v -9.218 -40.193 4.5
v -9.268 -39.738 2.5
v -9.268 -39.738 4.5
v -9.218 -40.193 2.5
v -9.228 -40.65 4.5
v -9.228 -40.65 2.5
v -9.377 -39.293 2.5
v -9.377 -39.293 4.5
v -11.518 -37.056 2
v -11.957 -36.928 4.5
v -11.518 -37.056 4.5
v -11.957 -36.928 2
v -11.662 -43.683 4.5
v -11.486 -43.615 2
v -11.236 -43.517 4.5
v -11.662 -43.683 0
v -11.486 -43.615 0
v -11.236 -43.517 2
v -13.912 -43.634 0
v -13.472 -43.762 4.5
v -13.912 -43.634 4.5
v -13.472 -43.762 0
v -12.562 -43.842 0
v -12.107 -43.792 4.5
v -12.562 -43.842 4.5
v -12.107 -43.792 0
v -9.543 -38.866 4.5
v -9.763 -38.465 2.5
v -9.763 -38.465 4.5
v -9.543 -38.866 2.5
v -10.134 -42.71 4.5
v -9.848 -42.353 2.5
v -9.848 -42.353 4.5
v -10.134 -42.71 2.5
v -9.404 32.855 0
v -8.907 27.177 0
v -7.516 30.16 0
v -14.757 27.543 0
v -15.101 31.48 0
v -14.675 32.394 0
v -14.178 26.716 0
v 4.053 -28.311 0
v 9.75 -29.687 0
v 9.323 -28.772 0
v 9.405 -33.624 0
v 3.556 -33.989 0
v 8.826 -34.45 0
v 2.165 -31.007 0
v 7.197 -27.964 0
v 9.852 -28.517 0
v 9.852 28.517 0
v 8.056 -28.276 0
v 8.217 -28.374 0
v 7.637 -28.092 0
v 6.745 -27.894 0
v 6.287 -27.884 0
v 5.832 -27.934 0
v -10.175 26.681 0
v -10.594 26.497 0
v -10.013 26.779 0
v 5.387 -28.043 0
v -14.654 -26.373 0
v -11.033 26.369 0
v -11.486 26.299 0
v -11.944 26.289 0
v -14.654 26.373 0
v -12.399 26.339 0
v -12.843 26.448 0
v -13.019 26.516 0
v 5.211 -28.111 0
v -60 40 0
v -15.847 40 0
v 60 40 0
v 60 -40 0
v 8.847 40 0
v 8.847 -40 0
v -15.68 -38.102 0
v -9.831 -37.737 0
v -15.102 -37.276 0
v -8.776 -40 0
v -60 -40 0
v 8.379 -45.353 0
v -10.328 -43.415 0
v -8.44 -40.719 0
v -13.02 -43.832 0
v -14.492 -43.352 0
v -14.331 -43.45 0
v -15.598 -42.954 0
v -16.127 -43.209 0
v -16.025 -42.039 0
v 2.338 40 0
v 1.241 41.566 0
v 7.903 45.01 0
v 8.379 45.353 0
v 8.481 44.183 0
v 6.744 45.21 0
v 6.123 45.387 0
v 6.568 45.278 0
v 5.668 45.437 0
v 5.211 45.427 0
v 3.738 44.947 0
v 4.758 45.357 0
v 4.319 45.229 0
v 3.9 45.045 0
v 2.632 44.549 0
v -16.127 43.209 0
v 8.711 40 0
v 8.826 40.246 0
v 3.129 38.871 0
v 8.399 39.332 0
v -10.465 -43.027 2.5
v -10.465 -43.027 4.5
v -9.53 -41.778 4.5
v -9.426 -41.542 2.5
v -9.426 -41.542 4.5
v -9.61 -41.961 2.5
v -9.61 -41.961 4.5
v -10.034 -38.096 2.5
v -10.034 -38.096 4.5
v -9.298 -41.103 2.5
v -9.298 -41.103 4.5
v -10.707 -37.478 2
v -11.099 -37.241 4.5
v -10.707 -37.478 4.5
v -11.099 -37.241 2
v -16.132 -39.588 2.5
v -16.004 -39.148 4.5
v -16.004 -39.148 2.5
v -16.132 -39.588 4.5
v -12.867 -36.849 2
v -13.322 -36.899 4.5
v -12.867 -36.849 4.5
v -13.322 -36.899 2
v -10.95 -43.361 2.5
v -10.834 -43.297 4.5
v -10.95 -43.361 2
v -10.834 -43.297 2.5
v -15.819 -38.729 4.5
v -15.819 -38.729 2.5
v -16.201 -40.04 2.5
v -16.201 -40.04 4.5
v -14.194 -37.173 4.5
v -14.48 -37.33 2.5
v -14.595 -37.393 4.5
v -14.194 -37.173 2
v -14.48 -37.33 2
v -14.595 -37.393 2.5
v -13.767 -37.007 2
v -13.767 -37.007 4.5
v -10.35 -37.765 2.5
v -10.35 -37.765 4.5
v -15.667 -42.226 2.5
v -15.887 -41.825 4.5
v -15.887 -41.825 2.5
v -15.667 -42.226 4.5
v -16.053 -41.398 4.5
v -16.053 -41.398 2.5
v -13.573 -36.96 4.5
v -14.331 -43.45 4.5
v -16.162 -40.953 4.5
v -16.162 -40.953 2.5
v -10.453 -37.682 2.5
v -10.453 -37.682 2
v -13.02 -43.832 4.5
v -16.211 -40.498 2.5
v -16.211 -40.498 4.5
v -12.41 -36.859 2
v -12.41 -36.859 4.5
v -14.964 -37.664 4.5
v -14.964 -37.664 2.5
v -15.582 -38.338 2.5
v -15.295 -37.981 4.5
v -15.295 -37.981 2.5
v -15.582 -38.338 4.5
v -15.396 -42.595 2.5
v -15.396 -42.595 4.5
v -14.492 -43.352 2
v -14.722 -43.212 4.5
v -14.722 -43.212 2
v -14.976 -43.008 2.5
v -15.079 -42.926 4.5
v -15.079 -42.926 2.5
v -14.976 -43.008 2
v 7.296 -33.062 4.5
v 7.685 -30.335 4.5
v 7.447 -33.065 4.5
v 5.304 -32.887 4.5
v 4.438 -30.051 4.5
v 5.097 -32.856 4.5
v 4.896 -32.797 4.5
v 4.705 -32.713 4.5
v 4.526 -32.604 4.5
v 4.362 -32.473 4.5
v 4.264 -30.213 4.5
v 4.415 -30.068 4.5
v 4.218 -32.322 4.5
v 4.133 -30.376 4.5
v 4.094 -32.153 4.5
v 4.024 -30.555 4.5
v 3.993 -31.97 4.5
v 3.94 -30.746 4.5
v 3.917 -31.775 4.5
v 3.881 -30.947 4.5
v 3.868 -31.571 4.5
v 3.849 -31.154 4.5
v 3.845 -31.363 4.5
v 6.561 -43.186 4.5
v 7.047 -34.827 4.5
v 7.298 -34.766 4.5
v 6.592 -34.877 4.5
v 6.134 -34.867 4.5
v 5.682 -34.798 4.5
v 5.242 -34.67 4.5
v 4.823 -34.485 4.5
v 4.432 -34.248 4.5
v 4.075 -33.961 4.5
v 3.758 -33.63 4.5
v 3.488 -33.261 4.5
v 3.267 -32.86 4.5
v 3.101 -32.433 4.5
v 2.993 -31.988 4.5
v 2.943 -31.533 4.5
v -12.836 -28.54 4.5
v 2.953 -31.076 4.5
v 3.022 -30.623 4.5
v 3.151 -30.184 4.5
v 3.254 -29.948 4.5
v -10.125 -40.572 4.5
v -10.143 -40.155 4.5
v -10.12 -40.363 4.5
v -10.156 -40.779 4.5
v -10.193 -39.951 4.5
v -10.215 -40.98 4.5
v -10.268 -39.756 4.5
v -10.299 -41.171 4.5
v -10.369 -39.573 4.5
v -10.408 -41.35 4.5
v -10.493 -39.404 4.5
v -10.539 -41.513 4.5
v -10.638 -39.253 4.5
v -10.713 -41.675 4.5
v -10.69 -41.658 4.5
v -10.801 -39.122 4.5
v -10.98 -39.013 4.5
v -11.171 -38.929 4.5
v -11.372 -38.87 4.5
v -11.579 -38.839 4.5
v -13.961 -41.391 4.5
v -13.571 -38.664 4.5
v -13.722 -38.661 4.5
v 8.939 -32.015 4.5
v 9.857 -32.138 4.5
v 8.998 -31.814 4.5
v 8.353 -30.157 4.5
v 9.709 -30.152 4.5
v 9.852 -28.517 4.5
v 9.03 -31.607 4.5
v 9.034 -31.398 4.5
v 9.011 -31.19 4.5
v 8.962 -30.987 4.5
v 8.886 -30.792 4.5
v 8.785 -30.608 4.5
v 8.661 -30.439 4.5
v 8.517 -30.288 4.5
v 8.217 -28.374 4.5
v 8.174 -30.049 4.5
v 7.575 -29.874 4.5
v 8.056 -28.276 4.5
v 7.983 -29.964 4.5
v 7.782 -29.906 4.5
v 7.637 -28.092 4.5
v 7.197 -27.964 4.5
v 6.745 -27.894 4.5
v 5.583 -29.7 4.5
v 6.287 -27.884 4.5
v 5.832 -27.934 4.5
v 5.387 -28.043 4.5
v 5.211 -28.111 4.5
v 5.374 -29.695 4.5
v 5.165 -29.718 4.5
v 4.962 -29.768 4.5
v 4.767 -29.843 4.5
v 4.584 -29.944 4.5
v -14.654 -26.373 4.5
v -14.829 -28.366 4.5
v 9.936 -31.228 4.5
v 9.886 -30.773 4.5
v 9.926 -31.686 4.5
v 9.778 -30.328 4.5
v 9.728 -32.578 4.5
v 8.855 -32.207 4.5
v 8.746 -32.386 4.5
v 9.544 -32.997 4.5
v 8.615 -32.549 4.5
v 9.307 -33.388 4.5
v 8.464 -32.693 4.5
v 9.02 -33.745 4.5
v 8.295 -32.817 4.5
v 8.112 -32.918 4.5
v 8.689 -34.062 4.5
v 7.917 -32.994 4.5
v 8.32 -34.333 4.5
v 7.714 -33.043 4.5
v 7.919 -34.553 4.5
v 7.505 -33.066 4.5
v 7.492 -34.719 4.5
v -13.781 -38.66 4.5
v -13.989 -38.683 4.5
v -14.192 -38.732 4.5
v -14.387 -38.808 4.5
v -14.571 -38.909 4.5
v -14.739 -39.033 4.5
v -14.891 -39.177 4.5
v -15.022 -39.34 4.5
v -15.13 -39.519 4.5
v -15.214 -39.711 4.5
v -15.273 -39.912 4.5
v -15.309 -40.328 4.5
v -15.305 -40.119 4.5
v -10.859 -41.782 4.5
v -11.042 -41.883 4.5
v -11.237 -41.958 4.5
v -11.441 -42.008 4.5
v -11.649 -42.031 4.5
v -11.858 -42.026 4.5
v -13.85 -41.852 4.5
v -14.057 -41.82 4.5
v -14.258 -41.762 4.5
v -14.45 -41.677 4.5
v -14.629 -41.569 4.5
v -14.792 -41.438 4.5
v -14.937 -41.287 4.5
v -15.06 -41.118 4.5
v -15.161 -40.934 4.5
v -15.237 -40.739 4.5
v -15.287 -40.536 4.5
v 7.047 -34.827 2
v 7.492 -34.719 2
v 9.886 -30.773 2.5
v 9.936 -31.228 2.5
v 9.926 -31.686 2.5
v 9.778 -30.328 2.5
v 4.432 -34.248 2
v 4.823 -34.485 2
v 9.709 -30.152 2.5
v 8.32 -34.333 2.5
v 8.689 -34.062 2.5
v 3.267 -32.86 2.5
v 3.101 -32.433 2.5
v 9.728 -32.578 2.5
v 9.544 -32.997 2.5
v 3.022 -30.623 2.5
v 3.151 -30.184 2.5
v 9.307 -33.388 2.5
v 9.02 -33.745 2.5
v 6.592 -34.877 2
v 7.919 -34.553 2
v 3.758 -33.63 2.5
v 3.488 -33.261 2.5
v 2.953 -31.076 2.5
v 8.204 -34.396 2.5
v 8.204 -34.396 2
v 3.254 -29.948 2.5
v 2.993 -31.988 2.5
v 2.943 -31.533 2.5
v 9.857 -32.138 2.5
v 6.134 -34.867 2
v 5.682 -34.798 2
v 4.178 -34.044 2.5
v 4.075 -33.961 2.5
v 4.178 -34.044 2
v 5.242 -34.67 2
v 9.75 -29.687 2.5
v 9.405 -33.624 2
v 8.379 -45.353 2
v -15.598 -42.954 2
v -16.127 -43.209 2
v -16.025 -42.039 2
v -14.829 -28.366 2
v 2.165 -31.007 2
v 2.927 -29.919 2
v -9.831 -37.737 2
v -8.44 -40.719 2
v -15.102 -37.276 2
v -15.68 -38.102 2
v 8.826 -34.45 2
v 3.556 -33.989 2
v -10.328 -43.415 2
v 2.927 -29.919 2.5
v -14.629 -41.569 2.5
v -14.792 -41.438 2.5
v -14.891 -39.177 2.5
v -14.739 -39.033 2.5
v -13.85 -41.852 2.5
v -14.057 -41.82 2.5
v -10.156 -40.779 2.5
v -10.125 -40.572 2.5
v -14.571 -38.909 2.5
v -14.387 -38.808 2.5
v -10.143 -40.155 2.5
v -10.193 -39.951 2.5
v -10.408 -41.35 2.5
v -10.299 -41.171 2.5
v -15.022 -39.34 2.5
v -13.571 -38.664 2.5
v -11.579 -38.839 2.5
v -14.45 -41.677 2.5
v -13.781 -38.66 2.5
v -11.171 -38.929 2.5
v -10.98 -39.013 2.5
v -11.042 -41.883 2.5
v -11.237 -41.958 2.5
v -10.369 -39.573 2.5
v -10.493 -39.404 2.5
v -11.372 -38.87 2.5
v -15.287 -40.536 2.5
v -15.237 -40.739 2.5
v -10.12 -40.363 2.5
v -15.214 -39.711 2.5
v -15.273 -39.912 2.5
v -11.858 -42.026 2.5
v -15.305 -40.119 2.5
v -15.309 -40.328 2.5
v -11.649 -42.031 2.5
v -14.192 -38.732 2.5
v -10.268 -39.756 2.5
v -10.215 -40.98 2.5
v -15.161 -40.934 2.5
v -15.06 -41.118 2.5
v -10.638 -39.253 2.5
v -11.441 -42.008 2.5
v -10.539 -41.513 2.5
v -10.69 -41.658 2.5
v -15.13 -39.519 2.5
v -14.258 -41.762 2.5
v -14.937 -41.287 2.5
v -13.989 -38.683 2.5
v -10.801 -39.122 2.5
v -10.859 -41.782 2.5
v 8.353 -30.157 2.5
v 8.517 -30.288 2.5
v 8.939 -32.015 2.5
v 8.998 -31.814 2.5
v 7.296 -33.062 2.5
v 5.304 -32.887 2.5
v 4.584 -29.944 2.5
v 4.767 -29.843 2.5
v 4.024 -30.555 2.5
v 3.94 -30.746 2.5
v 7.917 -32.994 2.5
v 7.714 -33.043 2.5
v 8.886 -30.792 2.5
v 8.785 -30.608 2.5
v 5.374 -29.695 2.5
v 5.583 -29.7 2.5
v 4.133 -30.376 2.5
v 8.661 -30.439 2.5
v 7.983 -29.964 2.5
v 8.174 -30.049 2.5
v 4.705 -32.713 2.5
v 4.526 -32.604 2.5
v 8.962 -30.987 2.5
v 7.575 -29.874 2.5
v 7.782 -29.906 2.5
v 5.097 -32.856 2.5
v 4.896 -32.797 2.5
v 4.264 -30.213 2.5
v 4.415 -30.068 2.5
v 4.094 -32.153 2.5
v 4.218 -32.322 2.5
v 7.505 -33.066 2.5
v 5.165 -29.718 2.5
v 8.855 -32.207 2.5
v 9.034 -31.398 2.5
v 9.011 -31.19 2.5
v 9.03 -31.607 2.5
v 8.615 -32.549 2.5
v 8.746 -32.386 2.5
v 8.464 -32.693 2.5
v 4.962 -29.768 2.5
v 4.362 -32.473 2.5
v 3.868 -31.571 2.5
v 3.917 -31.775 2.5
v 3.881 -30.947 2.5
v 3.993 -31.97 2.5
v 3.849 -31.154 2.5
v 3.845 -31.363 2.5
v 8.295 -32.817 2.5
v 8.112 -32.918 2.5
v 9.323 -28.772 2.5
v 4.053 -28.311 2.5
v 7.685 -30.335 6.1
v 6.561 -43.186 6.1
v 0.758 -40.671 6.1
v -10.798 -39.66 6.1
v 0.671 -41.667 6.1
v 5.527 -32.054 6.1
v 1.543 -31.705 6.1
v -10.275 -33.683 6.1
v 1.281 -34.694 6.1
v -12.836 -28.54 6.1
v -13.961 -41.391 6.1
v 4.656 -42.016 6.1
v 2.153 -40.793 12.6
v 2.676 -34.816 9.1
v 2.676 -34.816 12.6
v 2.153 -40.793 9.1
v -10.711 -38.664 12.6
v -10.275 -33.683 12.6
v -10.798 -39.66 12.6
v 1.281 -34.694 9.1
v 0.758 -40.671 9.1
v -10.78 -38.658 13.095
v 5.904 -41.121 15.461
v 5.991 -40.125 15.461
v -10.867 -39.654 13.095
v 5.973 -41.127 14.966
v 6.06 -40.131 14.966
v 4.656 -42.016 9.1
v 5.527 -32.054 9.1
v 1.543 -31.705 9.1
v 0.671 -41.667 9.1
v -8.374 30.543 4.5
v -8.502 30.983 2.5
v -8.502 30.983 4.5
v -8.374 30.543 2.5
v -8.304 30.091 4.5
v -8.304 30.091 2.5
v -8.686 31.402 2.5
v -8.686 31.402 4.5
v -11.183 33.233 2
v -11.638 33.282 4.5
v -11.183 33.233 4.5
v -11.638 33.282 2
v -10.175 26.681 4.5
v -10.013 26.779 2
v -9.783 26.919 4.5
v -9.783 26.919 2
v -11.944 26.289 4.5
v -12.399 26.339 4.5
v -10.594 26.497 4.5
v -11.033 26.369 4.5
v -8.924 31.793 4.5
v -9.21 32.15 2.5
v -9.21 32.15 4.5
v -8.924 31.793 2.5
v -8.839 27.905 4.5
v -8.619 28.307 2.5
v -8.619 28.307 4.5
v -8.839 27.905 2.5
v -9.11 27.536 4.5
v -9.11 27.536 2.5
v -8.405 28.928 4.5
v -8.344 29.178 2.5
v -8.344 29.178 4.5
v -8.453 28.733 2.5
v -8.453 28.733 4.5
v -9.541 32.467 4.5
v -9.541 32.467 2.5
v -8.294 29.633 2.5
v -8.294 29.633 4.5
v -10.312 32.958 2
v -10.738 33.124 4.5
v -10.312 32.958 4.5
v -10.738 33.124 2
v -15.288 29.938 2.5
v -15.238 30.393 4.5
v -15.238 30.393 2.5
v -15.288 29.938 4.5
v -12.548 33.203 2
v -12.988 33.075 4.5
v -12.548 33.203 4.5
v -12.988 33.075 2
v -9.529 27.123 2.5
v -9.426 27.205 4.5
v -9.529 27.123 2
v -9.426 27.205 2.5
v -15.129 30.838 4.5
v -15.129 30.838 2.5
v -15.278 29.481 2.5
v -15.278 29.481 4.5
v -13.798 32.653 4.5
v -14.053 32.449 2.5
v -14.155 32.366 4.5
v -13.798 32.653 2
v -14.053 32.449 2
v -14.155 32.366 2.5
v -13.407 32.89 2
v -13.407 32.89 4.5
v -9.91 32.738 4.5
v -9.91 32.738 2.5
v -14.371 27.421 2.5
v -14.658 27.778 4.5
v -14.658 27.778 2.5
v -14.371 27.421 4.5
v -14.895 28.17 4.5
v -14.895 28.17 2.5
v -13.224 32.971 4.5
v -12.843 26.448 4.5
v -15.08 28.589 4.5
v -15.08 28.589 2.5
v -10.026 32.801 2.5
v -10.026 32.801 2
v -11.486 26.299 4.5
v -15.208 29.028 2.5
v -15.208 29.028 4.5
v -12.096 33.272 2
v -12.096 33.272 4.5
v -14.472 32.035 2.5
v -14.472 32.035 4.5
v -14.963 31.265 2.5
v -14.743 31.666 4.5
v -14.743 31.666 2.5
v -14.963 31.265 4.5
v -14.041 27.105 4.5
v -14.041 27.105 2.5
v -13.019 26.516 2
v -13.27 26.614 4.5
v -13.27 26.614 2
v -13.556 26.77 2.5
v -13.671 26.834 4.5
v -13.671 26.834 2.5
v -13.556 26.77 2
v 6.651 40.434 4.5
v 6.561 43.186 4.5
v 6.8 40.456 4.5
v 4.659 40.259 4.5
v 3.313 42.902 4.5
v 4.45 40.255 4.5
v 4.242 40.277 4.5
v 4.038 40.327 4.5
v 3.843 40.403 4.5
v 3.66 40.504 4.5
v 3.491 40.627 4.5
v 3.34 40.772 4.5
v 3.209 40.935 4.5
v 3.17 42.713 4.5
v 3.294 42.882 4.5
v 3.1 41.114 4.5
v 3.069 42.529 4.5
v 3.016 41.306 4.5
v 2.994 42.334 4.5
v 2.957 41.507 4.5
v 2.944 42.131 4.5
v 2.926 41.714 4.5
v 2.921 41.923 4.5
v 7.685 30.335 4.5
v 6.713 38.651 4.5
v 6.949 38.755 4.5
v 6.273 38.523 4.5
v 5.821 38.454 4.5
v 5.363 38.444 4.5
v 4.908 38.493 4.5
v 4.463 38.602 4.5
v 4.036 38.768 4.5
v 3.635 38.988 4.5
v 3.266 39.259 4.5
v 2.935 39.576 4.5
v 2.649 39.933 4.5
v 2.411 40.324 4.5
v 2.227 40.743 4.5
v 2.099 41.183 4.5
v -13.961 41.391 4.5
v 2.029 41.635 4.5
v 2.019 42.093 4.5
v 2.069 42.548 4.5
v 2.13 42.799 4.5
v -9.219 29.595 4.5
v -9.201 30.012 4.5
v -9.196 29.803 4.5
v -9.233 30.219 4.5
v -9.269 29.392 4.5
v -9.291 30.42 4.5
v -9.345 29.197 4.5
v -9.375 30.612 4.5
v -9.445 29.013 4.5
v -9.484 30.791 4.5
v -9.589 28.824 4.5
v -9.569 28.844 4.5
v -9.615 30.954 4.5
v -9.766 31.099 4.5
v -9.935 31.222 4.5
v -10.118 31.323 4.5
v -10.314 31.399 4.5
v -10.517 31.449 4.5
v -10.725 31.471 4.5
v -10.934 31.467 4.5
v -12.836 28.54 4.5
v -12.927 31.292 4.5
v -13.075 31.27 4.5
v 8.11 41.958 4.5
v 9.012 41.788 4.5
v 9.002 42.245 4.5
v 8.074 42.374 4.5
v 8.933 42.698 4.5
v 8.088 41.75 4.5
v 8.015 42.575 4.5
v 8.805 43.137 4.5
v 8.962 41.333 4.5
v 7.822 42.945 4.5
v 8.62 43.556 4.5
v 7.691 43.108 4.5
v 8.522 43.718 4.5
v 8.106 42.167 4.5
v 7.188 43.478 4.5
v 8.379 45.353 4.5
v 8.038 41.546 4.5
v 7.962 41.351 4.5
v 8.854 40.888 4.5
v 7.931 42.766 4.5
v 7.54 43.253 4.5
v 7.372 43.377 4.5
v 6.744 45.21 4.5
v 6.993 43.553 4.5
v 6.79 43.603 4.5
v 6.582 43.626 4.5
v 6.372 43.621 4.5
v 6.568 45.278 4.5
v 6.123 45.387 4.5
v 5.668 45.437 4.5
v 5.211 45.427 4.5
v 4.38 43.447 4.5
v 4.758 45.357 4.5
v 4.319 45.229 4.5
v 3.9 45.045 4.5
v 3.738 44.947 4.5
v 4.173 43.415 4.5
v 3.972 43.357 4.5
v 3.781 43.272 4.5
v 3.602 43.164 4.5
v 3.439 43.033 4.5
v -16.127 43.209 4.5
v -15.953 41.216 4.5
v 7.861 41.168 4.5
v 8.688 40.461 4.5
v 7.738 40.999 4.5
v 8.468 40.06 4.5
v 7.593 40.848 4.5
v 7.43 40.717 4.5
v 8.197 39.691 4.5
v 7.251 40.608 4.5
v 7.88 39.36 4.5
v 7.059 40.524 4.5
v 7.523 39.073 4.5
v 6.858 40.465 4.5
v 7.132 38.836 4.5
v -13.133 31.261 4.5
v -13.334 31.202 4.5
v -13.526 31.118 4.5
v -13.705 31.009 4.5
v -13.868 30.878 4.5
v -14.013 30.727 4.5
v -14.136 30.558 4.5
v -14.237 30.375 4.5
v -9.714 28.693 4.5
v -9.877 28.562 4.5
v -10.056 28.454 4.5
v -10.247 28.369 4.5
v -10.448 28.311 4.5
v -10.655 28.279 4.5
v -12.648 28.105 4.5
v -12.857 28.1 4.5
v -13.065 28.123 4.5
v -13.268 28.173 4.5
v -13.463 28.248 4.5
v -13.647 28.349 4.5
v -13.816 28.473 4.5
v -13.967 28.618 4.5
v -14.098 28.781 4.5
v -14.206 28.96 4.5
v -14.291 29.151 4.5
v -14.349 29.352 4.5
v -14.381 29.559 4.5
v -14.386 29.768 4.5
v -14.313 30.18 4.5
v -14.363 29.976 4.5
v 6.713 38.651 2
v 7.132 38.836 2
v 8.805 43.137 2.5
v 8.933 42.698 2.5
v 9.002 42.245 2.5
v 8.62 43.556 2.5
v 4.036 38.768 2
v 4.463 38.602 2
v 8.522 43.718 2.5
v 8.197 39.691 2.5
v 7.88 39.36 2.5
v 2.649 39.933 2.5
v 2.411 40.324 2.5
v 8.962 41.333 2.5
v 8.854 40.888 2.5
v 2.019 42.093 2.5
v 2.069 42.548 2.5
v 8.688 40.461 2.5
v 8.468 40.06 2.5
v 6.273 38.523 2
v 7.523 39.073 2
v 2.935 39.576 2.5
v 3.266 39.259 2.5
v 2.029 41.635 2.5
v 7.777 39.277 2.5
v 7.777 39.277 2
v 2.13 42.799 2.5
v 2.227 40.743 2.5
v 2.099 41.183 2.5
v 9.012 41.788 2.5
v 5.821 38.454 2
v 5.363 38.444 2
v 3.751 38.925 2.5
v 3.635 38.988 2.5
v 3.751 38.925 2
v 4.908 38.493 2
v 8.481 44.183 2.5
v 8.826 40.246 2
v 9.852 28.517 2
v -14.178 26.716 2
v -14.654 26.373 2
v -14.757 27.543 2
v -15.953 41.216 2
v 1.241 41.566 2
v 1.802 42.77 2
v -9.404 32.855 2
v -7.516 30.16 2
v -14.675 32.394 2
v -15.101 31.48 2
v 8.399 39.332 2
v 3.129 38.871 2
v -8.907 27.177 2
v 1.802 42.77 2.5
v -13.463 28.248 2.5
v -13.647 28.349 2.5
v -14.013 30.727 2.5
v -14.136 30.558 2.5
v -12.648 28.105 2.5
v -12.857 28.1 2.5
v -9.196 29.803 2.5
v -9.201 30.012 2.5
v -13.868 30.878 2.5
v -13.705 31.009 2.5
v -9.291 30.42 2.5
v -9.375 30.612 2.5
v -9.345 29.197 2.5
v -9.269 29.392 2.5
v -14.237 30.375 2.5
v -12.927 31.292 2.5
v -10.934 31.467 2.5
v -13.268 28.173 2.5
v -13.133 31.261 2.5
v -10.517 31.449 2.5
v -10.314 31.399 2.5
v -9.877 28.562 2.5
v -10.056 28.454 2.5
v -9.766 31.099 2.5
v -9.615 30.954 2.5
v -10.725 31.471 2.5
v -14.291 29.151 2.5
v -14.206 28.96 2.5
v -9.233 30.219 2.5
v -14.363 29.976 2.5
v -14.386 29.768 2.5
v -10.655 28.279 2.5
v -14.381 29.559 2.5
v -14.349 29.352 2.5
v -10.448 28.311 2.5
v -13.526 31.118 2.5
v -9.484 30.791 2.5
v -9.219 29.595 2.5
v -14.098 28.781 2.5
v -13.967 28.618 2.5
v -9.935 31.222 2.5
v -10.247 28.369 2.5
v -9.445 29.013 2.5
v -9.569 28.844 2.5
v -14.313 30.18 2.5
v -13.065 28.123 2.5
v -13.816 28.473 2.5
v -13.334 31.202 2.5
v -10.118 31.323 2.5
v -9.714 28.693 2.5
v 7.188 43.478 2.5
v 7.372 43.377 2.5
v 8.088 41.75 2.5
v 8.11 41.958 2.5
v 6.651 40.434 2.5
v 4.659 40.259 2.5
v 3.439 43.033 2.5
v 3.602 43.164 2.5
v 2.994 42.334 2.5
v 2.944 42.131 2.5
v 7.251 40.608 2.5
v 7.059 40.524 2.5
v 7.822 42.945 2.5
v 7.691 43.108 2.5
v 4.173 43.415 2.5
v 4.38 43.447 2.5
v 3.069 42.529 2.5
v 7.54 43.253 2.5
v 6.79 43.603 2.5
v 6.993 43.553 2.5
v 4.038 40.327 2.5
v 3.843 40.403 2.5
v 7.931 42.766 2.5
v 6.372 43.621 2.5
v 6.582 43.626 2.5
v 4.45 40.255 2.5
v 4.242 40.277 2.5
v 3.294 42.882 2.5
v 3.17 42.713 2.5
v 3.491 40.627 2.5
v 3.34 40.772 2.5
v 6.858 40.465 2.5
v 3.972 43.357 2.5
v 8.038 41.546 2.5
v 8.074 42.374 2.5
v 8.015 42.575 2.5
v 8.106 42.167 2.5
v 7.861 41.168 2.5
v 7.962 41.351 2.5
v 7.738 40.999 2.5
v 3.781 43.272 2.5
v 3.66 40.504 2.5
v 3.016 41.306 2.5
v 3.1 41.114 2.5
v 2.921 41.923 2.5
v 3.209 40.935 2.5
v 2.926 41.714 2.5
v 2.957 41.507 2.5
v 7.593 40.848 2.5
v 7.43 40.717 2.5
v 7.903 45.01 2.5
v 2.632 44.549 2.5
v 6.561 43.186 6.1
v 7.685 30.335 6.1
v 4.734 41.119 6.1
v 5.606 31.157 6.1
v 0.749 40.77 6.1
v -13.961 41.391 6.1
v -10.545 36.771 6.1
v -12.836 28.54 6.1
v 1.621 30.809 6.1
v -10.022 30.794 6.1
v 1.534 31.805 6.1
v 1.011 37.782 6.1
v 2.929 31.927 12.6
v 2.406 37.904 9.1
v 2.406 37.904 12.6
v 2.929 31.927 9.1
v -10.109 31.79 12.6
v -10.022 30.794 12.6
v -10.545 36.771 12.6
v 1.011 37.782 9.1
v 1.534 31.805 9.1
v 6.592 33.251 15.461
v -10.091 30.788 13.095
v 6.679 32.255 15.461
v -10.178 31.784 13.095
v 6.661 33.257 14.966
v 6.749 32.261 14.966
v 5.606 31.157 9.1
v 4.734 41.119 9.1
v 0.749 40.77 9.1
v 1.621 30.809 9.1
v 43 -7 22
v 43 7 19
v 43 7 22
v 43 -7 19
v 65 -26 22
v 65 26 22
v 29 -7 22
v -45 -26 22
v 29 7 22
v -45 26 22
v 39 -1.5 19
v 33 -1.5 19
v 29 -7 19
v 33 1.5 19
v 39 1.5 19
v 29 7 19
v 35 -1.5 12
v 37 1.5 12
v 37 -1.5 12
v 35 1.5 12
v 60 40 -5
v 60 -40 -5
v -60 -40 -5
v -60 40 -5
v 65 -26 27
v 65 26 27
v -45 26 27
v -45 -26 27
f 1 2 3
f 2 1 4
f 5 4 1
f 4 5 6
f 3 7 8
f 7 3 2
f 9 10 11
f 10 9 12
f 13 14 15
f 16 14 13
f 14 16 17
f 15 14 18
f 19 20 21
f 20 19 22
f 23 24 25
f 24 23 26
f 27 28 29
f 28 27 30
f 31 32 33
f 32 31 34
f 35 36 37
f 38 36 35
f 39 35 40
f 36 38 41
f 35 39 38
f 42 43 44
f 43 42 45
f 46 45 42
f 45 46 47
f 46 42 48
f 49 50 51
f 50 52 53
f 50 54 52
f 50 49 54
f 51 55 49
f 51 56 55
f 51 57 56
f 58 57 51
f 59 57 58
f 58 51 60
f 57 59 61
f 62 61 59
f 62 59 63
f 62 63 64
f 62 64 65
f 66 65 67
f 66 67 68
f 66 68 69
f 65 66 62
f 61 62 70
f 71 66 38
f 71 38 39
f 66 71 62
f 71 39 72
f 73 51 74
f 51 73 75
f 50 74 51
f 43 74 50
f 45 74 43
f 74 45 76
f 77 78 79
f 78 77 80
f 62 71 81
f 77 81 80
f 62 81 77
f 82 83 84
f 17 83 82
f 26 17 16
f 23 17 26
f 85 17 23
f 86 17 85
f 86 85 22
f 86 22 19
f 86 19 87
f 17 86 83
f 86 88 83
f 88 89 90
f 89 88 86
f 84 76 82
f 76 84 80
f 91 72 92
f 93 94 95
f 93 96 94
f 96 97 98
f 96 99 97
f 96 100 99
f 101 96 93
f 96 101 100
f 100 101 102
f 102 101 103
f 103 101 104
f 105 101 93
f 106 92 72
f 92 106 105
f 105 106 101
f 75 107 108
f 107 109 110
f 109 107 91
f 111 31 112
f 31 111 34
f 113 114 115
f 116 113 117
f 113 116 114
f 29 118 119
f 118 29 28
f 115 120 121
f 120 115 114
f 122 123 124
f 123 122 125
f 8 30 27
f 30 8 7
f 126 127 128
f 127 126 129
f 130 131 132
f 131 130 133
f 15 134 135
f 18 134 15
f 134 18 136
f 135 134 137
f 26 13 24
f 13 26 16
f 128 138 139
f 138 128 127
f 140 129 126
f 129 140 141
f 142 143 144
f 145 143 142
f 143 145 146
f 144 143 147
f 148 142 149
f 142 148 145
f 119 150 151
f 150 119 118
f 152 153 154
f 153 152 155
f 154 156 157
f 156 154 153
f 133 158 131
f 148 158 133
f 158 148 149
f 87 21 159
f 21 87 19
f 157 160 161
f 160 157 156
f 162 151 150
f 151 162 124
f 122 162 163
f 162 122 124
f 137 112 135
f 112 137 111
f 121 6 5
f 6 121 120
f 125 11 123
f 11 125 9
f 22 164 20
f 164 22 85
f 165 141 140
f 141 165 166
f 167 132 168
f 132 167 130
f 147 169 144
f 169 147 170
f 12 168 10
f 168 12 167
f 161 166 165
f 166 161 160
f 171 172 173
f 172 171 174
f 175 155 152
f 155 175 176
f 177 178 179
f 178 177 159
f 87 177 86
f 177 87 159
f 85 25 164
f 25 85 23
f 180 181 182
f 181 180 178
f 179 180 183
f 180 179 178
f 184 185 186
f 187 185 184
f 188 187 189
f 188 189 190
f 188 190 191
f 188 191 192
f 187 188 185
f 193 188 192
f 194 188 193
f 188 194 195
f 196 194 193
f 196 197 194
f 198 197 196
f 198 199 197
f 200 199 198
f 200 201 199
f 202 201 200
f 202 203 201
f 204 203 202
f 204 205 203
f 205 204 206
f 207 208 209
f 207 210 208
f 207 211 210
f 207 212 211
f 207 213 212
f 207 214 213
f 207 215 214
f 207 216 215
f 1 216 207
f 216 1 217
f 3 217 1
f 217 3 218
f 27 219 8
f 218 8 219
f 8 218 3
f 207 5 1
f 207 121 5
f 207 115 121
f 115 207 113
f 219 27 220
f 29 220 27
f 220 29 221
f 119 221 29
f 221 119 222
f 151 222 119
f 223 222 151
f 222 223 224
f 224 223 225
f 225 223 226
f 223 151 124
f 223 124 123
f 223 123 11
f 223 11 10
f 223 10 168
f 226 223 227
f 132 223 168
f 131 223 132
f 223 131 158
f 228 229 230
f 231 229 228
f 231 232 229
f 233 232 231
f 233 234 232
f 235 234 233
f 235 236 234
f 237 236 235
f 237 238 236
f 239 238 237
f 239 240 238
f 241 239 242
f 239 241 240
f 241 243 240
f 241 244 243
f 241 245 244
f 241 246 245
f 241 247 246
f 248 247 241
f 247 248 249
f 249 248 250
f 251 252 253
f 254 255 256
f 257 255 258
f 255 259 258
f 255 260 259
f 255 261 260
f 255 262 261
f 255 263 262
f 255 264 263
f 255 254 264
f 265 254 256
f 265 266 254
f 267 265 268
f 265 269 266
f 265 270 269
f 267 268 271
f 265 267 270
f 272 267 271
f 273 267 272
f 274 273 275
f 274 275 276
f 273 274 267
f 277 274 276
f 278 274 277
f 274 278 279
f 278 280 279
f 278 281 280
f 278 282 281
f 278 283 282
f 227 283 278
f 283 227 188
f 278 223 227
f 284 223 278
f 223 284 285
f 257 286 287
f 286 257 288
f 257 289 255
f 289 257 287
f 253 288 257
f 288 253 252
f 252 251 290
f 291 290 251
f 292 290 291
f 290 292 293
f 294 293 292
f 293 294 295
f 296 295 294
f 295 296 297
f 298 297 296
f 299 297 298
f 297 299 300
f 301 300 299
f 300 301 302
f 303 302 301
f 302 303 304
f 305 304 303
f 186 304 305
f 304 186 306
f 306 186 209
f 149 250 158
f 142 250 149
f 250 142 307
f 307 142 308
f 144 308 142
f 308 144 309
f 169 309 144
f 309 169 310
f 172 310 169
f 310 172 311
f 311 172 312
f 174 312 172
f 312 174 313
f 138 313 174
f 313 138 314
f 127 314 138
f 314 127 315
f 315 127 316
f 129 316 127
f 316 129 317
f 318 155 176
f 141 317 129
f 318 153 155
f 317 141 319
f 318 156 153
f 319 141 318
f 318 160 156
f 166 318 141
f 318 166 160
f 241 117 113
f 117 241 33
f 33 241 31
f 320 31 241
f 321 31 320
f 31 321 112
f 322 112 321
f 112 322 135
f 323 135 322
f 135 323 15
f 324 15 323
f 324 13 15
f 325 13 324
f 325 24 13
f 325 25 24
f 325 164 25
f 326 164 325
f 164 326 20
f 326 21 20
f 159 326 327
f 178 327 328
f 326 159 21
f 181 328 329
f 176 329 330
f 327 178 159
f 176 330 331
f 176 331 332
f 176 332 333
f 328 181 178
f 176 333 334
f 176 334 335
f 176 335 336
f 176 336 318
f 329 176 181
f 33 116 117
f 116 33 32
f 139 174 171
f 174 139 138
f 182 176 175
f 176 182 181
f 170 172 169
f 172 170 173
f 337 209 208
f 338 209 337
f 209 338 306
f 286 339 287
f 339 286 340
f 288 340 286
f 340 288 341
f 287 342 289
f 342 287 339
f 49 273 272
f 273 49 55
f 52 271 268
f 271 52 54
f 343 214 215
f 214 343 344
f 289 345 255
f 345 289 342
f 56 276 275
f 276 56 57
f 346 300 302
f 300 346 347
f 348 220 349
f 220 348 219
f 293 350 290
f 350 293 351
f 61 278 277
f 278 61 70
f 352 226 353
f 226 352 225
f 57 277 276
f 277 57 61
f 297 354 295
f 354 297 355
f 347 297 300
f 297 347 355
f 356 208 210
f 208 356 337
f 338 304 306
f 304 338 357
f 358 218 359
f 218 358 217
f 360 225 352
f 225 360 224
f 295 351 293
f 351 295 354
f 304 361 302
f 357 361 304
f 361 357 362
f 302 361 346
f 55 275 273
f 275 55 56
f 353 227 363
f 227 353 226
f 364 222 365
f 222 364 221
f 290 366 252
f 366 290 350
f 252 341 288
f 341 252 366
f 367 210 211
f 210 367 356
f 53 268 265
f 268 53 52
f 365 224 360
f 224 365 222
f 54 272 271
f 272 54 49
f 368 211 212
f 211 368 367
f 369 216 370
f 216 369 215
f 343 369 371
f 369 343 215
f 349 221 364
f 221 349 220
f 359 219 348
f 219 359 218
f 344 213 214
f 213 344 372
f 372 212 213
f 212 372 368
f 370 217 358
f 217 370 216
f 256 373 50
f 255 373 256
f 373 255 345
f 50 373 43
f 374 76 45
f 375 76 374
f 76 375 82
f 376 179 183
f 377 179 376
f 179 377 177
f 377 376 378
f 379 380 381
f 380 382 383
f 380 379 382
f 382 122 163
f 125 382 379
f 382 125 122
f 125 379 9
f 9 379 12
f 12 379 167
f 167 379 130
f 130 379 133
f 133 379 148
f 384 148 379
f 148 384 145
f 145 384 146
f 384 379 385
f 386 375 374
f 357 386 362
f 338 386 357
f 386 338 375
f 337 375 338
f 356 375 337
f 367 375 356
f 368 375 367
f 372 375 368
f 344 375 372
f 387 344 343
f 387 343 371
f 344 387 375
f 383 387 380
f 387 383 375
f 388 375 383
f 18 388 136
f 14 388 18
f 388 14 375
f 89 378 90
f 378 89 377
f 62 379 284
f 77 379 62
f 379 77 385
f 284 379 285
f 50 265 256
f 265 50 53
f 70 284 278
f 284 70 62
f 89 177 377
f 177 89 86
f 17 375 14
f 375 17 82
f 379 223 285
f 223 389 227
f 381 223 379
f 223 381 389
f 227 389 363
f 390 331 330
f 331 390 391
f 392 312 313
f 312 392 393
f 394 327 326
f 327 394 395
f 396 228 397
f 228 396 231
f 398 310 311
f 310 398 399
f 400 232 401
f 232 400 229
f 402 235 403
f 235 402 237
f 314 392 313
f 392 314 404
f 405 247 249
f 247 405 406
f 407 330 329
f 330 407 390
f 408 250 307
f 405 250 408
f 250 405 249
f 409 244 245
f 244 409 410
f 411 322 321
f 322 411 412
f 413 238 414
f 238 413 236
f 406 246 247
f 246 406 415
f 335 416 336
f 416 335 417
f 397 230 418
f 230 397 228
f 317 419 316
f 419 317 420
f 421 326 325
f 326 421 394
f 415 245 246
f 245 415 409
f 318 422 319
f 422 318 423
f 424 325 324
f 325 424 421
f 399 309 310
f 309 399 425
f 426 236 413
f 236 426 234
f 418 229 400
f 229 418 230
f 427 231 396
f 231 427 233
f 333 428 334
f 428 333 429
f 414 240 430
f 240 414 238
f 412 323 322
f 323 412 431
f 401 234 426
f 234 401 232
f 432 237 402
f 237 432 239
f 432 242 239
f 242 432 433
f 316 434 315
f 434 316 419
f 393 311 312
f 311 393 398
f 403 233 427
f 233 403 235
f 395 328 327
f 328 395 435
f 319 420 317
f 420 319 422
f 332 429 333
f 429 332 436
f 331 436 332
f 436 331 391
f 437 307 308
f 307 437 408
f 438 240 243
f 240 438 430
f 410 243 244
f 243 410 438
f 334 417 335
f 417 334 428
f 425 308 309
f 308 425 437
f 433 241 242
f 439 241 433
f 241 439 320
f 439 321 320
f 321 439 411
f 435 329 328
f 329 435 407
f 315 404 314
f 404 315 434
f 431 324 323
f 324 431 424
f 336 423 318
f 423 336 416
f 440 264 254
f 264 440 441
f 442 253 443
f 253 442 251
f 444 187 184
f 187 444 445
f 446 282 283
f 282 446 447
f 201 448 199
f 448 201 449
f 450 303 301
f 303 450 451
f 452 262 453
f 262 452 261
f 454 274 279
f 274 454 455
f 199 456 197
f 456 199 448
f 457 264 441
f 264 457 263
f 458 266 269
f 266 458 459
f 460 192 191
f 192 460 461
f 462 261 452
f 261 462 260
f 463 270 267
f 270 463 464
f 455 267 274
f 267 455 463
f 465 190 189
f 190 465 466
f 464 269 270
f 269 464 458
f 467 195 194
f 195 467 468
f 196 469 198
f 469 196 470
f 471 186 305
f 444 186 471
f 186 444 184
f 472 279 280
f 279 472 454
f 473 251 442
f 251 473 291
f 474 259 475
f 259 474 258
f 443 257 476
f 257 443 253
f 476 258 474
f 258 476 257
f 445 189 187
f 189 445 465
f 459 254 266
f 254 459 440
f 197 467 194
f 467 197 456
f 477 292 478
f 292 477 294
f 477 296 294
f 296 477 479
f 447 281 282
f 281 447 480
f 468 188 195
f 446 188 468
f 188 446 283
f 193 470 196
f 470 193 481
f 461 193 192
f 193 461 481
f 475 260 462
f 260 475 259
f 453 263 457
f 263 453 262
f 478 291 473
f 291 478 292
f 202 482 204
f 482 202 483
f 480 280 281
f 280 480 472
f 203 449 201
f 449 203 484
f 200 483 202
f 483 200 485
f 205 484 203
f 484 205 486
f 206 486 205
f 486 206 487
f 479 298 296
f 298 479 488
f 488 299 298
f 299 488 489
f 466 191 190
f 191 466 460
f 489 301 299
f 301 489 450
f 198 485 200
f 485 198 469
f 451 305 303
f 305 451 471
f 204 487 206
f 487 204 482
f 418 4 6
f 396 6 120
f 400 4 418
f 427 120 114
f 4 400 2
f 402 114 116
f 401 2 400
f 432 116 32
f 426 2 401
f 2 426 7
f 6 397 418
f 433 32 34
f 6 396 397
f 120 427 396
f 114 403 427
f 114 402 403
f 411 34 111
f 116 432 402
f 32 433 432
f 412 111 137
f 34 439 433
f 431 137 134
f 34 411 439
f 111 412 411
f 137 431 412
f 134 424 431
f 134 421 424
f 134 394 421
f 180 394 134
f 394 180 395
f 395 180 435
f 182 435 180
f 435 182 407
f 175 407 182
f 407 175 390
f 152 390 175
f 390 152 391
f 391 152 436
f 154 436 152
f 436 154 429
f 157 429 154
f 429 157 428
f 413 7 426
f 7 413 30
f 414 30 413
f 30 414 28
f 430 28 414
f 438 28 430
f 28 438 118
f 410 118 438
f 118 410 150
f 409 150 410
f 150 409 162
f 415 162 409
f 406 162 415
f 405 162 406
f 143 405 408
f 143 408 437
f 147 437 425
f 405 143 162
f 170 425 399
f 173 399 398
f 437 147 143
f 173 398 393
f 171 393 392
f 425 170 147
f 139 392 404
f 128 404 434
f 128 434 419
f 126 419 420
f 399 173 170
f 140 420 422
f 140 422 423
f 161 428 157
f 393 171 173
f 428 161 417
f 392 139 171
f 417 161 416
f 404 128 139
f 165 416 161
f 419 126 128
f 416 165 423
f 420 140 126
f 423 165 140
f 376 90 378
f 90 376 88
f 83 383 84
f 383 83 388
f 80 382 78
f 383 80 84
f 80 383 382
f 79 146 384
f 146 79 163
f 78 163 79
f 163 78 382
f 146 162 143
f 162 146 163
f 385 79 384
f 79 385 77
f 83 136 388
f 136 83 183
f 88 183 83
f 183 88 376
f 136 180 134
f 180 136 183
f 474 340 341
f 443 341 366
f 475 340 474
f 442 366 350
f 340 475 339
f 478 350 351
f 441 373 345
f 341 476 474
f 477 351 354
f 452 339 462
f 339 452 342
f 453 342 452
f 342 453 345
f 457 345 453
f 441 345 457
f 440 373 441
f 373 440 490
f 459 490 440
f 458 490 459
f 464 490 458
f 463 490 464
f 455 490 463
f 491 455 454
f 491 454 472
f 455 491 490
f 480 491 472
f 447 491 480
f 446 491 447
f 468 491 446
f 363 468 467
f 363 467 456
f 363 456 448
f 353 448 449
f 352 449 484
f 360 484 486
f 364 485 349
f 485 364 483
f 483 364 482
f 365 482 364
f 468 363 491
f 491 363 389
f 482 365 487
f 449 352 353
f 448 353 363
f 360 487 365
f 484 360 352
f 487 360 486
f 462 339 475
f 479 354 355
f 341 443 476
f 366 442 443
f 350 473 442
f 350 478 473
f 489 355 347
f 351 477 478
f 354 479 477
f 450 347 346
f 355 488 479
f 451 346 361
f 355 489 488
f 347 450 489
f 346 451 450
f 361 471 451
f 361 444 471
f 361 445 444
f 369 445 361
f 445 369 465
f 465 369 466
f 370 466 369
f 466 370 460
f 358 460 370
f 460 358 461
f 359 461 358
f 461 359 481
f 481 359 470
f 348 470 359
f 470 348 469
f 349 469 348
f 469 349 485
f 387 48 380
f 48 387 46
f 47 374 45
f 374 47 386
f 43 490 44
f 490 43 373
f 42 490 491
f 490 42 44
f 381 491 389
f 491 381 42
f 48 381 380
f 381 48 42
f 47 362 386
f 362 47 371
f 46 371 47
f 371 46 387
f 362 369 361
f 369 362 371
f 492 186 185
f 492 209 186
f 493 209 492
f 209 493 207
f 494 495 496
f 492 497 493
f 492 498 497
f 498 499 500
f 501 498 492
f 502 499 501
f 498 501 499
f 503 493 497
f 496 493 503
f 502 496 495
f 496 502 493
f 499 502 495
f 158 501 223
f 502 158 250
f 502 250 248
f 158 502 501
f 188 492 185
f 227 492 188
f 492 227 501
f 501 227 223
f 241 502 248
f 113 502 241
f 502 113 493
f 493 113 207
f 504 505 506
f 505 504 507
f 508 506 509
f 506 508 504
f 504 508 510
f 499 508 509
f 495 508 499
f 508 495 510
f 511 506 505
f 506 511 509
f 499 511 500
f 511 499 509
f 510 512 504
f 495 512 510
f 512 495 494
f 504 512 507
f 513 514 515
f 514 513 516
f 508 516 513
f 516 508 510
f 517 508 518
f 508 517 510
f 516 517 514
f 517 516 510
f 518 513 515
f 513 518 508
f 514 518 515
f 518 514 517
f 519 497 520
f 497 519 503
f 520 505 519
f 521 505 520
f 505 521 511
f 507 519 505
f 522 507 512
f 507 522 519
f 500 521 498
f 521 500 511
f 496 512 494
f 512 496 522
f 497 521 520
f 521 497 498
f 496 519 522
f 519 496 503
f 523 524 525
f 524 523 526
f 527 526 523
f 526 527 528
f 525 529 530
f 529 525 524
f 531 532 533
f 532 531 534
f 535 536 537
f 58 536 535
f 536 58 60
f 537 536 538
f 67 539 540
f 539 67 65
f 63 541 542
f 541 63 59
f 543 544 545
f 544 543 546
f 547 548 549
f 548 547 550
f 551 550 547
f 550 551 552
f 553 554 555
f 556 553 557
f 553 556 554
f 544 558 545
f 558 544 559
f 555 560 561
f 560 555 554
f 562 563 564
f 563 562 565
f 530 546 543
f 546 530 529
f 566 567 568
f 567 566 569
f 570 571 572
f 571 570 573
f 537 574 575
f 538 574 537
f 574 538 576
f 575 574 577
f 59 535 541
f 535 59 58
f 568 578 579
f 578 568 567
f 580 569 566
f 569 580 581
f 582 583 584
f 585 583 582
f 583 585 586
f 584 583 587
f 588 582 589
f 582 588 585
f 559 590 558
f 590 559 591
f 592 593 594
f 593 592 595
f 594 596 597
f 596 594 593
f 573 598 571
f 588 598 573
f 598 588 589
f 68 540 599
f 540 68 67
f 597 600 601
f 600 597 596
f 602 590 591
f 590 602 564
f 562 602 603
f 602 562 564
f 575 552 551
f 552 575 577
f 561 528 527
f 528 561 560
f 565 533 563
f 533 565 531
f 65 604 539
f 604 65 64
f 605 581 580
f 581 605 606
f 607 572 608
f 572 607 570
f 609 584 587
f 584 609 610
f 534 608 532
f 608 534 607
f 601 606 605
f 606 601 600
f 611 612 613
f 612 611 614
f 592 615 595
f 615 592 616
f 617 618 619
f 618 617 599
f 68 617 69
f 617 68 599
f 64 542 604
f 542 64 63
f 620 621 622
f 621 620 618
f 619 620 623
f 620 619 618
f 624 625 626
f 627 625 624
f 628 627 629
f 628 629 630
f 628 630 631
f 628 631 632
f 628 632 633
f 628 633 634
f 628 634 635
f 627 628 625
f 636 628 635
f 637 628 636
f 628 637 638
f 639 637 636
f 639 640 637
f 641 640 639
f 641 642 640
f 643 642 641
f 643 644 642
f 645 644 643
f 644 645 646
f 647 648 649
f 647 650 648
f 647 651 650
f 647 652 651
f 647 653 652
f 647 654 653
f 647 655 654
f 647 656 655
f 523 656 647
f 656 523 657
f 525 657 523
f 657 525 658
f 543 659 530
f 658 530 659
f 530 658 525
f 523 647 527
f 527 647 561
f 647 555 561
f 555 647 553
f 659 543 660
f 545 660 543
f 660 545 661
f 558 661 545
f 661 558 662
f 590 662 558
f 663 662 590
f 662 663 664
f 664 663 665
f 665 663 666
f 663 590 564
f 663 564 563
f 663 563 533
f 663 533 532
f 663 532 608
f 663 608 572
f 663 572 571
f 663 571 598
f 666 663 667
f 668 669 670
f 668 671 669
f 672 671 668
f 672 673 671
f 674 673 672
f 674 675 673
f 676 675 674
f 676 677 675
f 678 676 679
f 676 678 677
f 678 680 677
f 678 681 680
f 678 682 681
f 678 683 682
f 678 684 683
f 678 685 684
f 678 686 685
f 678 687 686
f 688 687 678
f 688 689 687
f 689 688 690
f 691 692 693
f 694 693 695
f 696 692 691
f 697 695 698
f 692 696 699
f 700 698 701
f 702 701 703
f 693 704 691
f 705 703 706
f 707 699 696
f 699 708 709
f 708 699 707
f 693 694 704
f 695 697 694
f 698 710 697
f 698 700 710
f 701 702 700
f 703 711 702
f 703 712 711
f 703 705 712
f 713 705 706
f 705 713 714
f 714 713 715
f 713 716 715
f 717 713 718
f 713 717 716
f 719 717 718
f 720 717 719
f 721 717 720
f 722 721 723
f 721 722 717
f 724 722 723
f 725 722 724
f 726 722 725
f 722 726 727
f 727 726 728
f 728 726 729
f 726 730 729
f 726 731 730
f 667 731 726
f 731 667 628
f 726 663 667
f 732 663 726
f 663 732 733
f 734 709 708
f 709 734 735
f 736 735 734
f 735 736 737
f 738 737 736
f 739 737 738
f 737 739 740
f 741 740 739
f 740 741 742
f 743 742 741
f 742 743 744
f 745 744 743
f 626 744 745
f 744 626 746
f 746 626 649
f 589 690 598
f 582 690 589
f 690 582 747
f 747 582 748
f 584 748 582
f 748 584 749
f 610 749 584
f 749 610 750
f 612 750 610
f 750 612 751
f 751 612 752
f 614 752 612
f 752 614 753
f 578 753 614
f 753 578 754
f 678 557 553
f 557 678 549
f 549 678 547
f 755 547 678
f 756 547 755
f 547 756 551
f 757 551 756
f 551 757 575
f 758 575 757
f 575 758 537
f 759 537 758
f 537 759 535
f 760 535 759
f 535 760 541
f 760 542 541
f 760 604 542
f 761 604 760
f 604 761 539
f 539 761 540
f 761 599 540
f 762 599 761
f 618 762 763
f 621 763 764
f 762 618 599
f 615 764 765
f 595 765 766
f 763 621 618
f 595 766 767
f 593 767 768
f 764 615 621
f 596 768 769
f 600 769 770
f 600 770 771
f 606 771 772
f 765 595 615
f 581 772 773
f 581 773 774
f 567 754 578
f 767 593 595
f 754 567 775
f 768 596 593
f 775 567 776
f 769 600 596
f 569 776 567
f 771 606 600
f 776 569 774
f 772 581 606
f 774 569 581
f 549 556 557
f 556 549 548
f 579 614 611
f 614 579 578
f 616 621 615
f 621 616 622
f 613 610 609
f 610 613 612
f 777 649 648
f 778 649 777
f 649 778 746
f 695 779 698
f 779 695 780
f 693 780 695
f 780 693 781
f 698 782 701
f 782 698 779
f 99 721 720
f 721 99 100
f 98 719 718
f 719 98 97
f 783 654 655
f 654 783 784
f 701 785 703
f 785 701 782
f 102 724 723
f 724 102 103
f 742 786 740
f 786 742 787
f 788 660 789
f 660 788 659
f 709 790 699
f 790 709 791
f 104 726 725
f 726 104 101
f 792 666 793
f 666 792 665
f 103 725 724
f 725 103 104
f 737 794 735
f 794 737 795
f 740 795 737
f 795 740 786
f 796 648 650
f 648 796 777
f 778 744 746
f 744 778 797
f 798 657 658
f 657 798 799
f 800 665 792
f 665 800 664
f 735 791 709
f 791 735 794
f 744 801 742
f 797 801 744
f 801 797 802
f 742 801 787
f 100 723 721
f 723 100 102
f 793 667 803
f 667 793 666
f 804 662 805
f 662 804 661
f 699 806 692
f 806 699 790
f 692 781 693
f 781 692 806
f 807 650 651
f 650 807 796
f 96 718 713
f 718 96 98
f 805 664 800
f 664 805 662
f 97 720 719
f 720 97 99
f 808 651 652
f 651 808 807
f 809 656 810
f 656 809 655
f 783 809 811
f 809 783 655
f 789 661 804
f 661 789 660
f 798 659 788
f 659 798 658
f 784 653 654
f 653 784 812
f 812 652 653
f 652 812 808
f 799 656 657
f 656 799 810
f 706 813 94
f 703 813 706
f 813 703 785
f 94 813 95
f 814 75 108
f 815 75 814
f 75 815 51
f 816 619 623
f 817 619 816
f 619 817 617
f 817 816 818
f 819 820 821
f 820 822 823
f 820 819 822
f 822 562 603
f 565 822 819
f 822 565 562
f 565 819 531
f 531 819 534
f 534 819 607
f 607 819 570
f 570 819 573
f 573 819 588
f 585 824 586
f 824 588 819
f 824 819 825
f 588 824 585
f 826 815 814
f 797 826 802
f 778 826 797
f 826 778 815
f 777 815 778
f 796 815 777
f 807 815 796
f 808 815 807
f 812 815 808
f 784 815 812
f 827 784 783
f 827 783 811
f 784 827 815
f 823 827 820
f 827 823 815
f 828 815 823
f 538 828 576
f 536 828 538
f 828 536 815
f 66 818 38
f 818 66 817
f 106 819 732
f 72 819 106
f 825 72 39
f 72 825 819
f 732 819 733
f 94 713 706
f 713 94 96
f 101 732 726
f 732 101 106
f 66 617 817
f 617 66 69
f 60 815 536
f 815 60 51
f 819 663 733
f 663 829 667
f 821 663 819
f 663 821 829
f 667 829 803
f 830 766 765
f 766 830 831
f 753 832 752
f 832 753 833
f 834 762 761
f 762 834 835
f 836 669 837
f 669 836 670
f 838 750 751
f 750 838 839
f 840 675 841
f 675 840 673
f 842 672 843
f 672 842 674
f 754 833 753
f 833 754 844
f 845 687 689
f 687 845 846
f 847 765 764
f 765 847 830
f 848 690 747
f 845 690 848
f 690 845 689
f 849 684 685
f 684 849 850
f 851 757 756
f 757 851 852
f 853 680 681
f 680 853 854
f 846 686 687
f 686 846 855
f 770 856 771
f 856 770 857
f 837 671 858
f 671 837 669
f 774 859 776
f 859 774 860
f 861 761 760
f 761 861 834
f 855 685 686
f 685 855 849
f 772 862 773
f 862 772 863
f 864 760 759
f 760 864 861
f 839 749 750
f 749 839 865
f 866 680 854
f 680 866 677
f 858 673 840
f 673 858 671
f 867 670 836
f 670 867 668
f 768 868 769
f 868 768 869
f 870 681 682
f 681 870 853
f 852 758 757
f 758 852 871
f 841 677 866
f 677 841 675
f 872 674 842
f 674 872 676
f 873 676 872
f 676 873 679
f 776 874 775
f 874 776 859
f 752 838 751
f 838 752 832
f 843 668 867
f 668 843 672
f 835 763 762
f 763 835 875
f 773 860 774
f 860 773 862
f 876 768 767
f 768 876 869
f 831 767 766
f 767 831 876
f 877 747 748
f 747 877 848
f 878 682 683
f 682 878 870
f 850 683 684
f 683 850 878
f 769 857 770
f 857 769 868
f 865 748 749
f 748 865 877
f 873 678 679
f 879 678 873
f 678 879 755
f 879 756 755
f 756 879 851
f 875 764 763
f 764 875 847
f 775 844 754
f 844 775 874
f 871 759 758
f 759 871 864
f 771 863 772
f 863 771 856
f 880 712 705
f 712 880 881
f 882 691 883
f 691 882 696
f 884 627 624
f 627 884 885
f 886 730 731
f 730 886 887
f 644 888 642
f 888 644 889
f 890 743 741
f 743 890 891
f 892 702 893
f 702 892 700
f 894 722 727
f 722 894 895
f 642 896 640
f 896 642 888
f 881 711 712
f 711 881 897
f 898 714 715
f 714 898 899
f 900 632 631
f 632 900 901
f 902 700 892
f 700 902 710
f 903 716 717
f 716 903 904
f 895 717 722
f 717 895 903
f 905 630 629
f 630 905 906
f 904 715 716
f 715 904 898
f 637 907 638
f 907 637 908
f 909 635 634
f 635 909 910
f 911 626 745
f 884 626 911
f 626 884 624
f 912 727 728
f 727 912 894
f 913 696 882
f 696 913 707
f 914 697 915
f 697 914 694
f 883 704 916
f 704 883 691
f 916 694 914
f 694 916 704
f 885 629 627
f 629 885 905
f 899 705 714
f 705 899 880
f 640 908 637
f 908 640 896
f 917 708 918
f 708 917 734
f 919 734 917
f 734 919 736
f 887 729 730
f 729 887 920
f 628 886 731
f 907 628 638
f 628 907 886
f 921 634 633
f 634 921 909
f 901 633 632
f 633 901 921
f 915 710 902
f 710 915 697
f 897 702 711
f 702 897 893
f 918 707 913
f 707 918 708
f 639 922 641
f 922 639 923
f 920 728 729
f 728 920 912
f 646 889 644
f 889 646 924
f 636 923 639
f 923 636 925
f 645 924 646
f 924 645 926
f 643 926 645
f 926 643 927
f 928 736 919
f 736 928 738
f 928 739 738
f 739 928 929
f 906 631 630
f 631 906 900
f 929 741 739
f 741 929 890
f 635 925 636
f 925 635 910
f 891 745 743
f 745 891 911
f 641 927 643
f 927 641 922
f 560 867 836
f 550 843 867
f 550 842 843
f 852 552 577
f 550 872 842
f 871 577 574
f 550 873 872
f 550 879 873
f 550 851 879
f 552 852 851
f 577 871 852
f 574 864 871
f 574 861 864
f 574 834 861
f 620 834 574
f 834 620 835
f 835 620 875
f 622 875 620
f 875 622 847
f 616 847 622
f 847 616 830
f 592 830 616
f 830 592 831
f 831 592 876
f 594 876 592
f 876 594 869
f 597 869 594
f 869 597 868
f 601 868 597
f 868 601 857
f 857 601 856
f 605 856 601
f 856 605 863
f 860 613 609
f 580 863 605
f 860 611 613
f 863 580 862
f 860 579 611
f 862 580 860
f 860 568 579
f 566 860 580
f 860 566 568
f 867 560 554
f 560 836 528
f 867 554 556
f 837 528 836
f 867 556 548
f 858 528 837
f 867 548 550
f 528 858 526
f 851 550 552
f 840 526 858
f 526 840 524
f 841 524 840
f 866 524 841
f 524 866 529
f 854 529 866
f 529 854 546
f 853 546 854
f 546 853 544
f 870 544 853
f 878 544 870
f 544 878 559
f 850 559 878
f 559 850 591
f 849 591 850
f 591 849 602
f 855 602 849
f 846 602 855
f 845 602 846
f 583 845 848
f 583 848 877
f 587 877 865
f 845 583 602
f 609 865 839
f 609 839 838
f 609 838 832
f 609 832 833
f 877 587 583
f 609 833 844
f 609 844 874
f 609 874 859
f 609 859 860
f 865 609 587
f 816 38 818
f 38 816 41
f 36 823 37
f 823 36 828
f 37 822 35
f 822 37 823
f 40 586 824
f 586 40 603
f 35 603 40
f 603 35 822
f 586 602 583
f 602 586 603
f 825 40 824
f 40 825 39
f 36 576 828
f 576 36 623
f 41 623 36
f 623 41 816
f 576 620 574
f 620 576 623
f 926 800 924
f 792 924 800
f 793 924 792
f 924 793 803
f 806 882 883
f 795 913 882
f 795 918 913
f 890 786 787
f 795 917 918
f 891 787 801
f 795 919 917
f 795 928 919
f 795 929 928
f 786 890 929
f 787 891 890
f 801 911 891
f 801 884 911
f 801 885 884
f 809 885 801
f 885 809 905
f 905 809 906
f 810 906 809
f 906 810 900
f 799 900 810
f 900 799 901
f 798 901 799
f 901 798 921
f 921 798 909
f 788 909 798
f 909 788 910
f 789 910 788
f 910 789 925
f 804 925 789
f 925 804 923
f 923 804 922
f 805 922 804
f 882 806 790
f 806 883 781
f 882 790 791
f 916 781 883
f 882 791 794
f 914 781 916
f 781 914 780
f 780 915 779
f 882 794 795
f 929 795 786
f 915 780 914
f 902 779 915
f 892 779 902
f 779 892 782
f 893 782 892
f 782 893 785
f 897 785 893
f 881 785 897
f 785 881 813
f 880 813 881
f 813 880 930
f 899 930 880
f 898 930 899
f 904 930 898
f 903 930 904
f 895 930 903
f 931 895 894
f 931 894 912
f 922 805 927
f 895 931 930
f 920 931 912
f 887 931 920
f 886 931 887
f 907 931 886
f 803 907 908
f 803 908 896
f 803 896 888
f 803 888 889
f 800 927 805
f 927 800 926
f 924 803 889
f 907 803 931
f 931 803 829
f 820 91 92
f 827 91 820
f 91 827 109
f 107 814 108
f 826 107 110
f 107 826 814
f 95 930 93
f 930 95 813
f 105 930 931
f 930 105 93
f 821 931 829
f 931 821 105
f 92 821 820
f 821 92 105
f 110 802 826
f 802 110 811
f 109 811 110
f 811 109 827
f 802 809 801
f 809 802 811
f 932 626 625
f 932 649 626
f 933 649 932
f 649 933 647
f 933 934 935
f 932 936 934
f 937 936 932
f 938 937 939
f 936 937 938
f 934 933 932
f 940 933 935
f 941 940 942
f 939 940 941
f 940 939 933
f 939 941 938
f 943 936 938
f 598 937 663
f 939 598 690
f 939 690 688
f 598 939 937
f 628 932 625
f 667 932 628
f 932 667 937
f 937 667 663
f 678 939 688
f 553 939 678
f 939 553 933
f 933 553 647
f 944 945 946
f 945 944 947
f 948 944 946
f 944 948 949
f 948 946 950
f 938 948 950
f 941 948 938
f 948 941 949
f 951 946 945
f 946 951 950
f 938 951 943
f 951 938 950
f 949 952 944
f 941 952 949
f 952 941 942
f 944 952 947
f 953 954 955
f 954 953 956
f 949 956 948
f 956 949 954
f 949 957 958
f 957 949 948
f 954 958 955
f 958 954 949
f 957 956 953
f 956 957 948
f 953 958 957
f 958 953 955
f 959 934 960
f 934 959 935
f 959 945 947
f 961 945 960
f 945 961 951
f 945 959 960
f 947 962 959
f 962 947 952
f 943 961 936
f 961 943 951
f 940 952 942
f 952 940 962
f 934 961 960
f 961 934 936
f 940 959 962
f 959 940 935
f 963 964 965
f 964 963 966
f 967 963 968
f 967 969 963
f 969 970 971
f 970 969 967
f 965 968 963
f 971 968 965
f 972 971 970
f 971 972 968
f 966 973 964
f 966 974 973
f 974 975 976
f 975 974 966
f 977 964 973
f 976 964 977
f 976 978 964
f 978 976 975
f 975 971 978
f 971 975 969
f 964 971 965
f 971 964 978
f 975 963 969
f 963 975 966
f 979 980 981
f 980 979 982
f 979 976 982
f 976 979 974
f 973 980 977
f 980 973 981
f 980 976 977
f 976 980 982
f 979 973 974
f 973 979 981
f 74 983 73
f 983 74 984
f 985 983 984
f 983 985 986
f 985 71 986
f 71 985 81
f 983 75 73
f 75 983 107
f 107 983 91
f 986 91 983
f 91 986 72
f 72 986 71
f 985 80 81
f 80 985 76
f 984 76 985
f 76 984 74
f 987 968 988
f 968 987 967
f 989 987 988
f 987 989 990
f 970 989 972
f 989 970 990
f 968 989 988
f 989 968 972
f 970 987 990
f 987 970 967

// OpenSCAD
// owlet stepper head, by Mrunmoy
// Copyright (c) 2026 Mrunmoy. SPDX-License-Identifier: MIT
// https://github.com/Mrunmoy/owlet
//
// Mounts for the limit switches on the stepper head: the common 3D-printer
// endstop module (a lever microswitch on a 20.6 x 12.9 mm board with two
// corner holes and an S/G/V plug).
//
//   openscad -D 'part="pan_bracket"' -o stl/pan_bracket.stl switch_mounts.scad
//     parts: pan_bracket | pan_flag | assembly
//
// Pan: two brackets glued to the base deck at radius `r_sw`, 95 degrees
// either side of straight ahead; one flag glued under the yoke at the same
// radius, hanging down to press the switch levers. Tilt mounts come once
// the tilt shaft's overhang is known.
//
// All dimensions in mm. Measure the board's hole spacing and set hole_dx /
// hole_dy; until then the holes are slotted.

part = "assembly";
$fn = 48;

// ── The switch board ────────────────────────────────────────────
bd_l     = 20.6;       // board length (along the lever)
bd_w     = 12.9;       // board width
bd_t     = 1.6;        // bare PCB
hole_d   = 3.2;        // corner holes, M3 clearance
hole_dx  = 18.3;       // from the measured 21.13 mm diagonal, assuming equal margins at both corners
hole_dy  = 10.6;       // as above; the diagonal alone cannot separate the two
slot     = 1.0;        // slot length each way: covers the unknown split of the diagonal
under    = 2.5;        // standoff: just enough for the solder tails under the board
lever_up = 5;          // how far the lever stands above the switch body when at rest
body_h   = 6.5;        // switch body above the board

// ── Where they go on the head ───────────────────────────────────
r_sw     = 36;         // radius of the switch levers and the flag from the pan axis
sw_angle = 95;         // flag meets the lever at +/- this many degrees from straight ahead
deck_to_yoke = 22;     // clear height between the base deck and the yoke underside
flag_len = 8;          // how far the flag hangs below the yoke. Set by the switch, not by taste: the
                       // lever only travels about 3 mm, so the flag's edge sits about 3 mm below the
                       // lever's rest height and must stay clear of the switch body beneath it
flag_w   = 6;
flag_t   = 3;

// ── Pan bracket: glued flat to the deck, board lying on it ──────
module pan_bracket()
{
    plate_l = bd_l + 4;
    plate_w = bd_w + 4;
    difference()
    {
        union()
        {
            translate([-plate_l / 2, -plate_w / 2, 0]) cube([plate_l, plate_w, 2]);  // foot
            for (sx = [-1, 1]) translate([sx * hole_dx / 2, sx * hole_dy / 2, 0])
                cylinder(d = 7, h = 2 + under);                                     // standoffs under the holes
            // a lip the board's far edge rests on, so it cannot tilt when pressed
            translate([-plate_l / 2, plate_w / 2 - 2, 0]) cube([plate_l, 2, 2 + under]);
        }
        for (sx = [-1, 1]) translate([sx * hole_dx / 2, sx * hole_dy / 2, -1]) hull()
        {
            translate([-slot, 0, 0]) cylinder(d = hole_d, h = 10);
            translate([ slot, 0, 0]) cylinder(d = hole_d, h = 10);
        }
        // M3 nut pockets underneath, so the screws need no spanner
        for (sx = [-1, 1]) translate([sx * hole_dx / 2, sx * hole_dy / 2, -1]) hull()
        {
            translate([-slot, 0, 0]) cylinder(d = 5.7 / cos(30), h = 3.5, $fn = 6);
            translate([ slot, 0, 0]) cylinder(d = 5.7 / cos(30), h = 3.5, $fn = 6);
        }
    }
}

// ── Pan flag: glued to the yoke's underside, blade hangs down ───
module pan_flag()
{
    pad = 14;
    translate([-pad / 2, -pad / 2, 0]) cube([pad, pad, flag_t]);                     // glue pad
    // blade: ramped on both faces along the sweep, so it rides onto the lever from either side
    hull()
    {
        translate([-flag_w / 2, -flag_t / 2, 0]) cube([flag_w, flag_t, 1]);
        translate([-flag_w / 2 + 2, -flag_t / 2, -flag_len + 1]) cube([flag_w - 4, flag_t, 1]);
    }
}

// ── Mock switch board for the assembly view ─────────────────────
module board()
{
    color("darkgreen") translate([-bd_l / 2, -bd_w / 2, 0]) cube([bd_l, bd_w, bd_t]);
    color("#222") translate([-bd_l / 2 + 3, -bd_w / 2 + 2, bd_t]) cube([13, 6, body_h]);     // switch body
    color("silver") translate([-bd_l / 2 + 3, -bd_w / 2 + 2, bd_t + body_h]) rotate([0, -8, 0]) cube([17, 1, 0.5]); // lever
    color("white") translate([bd_l / 2 - 6, -bd_w / 2 + 1, bd_t]) cube([4, 10, 3]);           // plug
}

module assembly()
{
    // the deck is z = 0 here; the yoke's underside is deck_to_yoke above it
    color("steelblue", 0.3) translate([-60, -40, -5]) cube([120, 80, 5]);
    // each board faces its lever tip toward the flag, so the flag presses the tip, not the hinge
    for (s = [-1, 1]) rotate(s * sw_angle) translate([r_sw, 0, 0]) rotate(-s * 90)
    {
        color("white") pan_bracket();
        translate([0, 0, 2 + under]) board();
    }
    color("orange") translate([r_sw, 0, deck_to_yoke - flag_t]) pan_flag();
    color("gray", 0.3) translate([-45, -26, deck_to_yoke]) cube([110, 52, 5]);
}

if (part == "assembly")   assembly();
if (part == "pan_bracket") pan_bracket();
if (part == "pan_flag")    translate([0, 0, flag_t]) rotate([180, 0, 0]) pan_flag();   // pad down, blade up
